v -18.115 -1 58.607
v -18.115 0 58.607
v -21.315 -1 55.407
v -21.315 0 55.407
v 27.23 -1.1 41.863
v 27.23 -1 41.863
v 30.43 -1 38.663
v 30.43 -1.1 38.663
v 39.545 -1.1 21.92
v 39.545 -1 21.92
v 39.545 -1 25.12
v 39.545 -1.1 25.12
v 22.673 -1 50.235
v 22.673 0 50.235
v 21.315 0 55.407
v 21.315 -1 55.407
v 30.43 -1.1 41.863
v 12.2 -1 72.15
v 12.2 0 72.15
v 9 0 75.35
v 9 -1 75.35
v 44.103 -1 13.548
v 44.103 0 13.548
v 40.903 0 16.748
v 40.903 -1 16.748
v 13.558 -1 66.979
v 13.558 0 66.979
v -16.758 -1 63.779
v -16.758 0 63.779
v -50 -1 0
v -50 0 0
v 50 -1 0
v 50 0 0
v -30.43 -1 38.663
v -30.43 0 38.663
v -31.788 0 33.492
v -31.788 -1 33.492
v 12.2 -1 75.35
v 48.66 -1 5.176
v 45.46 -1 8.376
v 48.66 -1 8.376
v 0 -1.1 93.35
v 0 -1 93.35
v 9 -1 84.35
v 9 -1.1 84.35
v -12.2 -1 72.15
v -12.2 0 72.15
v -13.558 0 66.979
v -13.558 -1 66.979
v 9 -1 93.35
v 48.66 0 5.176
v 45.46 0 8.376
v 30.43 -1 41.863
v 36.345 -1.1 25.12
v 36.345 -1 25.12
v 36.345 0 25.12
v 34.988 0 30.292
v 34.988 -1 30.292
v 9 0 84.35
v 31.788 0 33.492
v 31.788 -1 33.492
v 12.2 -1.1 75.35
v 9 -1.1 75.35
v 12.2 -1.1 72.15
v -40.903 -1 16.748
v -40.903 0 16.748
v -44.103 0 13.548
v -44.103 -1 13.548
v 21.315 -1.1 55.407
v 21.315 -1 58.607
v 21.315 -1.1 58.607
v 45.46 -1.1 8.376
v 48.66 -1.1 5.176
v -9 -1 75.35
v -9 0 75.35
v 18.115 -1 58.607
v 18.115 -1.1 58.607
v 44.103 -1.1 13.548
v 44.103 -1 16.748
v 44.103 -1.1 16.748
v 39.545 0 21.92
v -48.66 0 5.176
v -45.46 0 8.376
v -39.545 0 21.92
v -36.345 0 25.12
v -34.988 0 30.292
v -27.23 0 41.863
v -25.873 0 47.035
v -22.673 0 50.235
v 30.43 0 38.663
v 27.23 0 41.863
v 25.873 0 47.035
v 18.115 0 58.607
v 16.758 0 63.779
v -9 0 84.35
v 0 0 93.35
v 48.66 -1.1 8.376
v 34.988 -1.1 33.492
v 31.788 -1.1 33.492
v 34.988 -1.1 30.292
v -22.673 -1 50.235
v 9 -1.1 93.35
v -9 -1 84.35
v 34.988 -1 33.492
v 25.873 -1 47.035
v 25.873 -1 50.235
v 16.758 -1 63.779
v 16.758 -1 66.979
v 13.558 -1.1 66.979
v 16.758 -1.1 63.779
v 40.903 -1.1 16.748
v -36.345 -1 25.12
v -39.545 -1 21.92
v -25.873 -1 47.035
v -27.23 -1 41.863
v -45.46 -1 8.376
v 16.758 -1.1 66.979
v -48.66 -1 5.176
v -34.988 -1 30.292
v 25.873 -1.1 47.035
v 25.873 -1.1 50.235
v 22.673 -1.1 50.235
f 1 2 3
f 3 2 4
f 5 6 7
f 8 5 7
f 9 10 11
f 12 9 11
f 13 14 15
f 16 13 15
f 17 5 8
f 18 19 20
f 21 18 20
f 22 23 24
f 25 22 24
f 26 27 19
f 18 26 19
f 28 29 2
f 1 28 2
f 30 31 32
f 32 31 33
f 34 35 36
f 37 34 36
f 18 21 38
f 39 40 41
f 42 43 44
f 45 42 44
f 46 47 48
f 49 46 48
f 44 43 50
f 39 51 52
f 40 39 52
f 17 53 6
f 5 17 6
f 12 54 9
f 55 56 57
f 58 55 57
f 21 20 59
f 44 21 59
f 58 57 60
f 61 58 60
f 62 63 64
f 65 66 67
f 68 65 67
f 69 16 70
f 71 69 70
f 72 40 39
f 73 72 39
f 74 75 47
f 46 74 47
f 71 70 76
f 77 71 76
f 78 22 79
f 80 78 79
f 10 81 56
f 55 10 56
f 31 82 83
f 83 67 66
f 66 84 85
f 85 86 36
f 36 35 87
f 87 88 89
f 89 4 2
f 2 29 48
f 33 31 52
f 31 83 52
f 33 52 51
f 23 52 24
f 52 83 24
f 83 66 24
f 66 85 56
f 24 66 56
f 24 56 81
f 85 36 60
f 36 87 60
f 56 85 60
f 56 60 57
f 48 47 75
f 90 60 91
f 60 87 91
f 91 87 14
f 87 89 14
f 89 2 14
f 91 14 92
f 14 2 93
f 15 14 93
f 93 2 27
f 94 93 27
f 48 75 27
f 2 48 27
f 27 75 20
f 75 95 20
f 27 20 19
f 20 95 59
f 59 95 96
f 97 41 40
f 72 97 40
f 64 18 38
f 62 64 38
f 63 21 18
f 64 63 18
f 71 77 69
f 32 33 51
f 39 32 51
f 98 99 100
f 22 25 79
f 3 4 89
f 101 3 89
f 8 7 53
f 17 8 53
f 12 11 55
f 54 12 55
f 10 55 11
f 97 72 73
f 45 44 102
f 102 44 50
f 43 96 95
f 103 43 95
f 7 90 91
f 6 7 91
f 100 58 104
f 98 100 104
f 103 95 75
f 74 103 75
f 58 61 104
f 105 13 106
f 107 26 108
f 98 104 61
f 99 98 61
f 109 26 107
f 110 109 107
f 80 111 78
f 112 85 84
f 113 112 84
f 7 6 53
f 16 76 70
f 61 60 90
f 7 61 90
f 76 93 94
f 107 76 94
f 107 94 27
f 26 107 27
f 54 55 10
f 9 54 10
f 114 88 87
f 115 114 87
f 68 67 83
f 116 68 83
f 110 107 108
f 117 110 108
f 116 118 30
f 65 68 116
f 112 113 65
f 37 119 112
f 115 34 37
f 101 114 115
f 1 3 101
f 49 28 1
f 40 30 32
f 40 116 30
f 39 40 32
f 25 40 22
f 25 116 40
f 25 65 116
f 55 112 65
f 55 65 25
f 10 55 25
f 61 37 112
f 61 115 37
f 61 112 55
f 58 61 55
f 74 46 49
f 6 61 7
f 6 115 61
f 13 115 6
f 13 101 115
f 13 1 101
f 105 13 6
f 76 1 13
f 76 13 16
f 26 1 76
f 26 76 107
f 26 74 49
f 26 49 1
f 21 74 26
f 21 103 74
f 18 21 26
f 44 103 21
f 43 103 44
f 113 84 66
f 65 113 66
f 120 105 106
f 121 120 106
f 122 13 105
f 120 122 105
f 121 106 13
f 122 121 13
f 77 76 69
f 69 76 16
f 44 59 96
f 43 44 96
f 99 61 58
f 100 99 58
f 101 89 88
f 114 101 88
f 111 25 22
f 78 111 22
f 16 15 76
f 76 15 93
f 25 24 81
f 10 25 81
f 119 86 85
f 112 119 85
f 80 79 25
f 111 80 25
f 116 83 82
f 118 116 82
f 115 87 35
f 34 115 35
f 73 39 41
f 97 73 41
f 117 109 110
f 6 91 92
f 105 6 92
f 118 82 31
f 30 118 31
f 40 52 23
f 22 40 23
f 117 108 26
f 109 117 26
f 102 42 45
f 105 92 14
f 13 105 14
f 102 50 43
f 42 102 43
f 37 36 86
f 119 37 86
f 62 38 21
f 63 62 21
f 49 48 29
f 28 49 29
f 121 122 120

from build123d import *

# Parameters (mm, degrees)
F1_DEPTH = 1
F4_DEPTH = 0.1


with BuildPart() as f1:
    # F0 (on Front) → F1 (new body)
    with BuildSketch(Plane.XZ):
        Polygon((-50, 0), (50, 0), (48.6602375707, 5.1763770008), (45.4602378533, 8.3763767182), (44.1027078336, 13.5481225034), (40.9027081162, 16.7481222208), (39.5451780966, 21.919868006), (36.3451783791, 25.1198677235), (34.9876483595, 30.2916135086), (31.787648642, 33.4916132261), (30.4301186224, 38.6633590113), (27.230118905, 41.8633587287), (25.8725888853, 47.0351045139), (22.6725891679, 50.2351042313), (21.3150591482, 55.4068500165), (18.1150594308, 58.606849734), (16.7575294111, 63.7785955192), (13.5575296937, 66.9785952366), (12.1999996741, 72.1503410218), (8.9999999566, 75.3503407392), (8.9999999566, 84.3503407392), (0, 93.3503406959), (-8.9999999566, 84.3503407392), (-8.9999999566, 75.3503407392), (-12.1999996741, 72.1503410218), (-13.5575296937, 66.9785952366), (-16.7575294111, 63.7785955192), (-18.1150594308, 58.606849734), (-21.3150591482, 55.4068500165), (-22.6725891679, 50.2351042313), (-25.8725888853, 47.0351045139), (-27.230118905, 41.8633587287), (-30.4301186224, 38.6633590113), (-31.787648642, 33.4916132261), (-34.9876483595, 30.2916135086), (-36.3451783791, 25.1198677235), (-39.5451780966, 21.919868006), (-40.9027081162, 16.7481222208), (-44.1027078336, 13.5481225034), (-45.4602378533, 8.3763767182), (-48.6602375707, 5.1763770008), align=None)
    extrude(amount=F1_DEPTH)


with BuildPart() as f4:
    # F3 (on face) → F4 (new body)
    with BuildSketch(Plane.XZ.offset(1)):
        Polygon((45.4602378533, 8.3763767182), (48.6602375707, 5.1763770008), (48.6602375707, 8.3763767182), align=None)
    extrude(amount=F4_DEPTH)


with BuildPart() as f4b:
    # F3 (on face) → F4, piece 2 (new body)
    with BuildSketch(Plane.XZ.offset(1)):
        Polygon((40.9027081162, 16.7481222208), (44.1027078336, 13.5481225034), (44.1027078336, 16.7481222208), align=None)
    extrude(amount=F4_DEPTH)


with BuildPart() as f4c:
    # F3 (on face) → F4, piece 3 (new body)
    with BuildSketch(Plane.XZ.offset(1)):
        Polygon((36.3451783791, 25.1198677235), (39.5451780966, 21.919868006), (39.5451780966, 25.1198677235), align=None)
    extrude(amount=F4_DEPTH)


with BuildPart() as f4d:
    # F3 (on face) → F4, piece 4 (new body)
    with BuildSketch(Plane.XZ.offset(1)):
        Polygon((31.787648642, 33.4916132261), (34.9876483595, 30.2916135086), (34.9876483595, 33.4916132261), align=None)
    extrude(amount=F4_DEPTH)


with BuildPart() as f4e:
    # F3 (on face) → F4, piece 5 (new body)
    with BuildSketch(Plane.XZ.offset(1)):
        Polygon((27.230118905, 41.8633587287), (30.4301186224, 38.6633590113), (30.4301186224, 41.8633587287), align=None)
    extrude(amount=F4_DEPTH)


with BuildPart() as f4f:
    # F3 (on face) → F4, piece 6 (new body)
    with BuildSketch(Plane.XZ.offset(1)):
        Polygon((22.6725891679, 50.2351042313), (25.8725888853, 47.0351045139), (25.8725888853, 50.2351042313), align=None)
    extrude(amount=F4_DEPTH)


with BuildPart() as f4g:
    # F3 (on face) → F4, piece 7 (new body)
    with BuildSketch(Plane.XZ.offset(1)):
        Polygon((18.1150594308, 58.606849734), (21.3150591482, 55.4068500165), (21.3150591482, 58.606849734), align=None)
    extrude(amount=F4_DEPTH)


with BuildPart() as f4h:
    # F3 (on face) → F4, piece 8 (new body)
    with BuildSketch(Plane.XZ.offset(1)):
        Polygon((13.5575296937, 66.9785952366), (16.7575294111, 63.7785955192), (16.7575294111, 66.9785952366), align=None)
    extrude(amount=F4_DEPTH)


with BuildPart() as f4i:
    # F3 (on face) → F4, piece 9 (new body)
    with BuildSketch(Plane.XZ.offset(1)):
        Polygon((8.9999999566, 75.3503407392), (12.1999996741, 72.1503410218), (12.1999996741, 75.3503407392), align=None)
    extrude(amount=F4_DEPTH)


with BuildPart() as f4j:
    # F3 (on face) → F4, piece 10 (new body)
    with BuildSketch(Plane.XZ.offset(1)):
        Polygon((0, 93.3503406959), (8.9999999566, 84.3503407392), (8.9999999566, 93.3503406959), align=None)
    extrude(amount=F4_DEPTH)


solid = Compound([f1.part, f4.part, f4b.part, f4c.part, f4d.part, f4e.part, f4f.part, f4g.part, f4h.part, f4i.part, f4j.part])
